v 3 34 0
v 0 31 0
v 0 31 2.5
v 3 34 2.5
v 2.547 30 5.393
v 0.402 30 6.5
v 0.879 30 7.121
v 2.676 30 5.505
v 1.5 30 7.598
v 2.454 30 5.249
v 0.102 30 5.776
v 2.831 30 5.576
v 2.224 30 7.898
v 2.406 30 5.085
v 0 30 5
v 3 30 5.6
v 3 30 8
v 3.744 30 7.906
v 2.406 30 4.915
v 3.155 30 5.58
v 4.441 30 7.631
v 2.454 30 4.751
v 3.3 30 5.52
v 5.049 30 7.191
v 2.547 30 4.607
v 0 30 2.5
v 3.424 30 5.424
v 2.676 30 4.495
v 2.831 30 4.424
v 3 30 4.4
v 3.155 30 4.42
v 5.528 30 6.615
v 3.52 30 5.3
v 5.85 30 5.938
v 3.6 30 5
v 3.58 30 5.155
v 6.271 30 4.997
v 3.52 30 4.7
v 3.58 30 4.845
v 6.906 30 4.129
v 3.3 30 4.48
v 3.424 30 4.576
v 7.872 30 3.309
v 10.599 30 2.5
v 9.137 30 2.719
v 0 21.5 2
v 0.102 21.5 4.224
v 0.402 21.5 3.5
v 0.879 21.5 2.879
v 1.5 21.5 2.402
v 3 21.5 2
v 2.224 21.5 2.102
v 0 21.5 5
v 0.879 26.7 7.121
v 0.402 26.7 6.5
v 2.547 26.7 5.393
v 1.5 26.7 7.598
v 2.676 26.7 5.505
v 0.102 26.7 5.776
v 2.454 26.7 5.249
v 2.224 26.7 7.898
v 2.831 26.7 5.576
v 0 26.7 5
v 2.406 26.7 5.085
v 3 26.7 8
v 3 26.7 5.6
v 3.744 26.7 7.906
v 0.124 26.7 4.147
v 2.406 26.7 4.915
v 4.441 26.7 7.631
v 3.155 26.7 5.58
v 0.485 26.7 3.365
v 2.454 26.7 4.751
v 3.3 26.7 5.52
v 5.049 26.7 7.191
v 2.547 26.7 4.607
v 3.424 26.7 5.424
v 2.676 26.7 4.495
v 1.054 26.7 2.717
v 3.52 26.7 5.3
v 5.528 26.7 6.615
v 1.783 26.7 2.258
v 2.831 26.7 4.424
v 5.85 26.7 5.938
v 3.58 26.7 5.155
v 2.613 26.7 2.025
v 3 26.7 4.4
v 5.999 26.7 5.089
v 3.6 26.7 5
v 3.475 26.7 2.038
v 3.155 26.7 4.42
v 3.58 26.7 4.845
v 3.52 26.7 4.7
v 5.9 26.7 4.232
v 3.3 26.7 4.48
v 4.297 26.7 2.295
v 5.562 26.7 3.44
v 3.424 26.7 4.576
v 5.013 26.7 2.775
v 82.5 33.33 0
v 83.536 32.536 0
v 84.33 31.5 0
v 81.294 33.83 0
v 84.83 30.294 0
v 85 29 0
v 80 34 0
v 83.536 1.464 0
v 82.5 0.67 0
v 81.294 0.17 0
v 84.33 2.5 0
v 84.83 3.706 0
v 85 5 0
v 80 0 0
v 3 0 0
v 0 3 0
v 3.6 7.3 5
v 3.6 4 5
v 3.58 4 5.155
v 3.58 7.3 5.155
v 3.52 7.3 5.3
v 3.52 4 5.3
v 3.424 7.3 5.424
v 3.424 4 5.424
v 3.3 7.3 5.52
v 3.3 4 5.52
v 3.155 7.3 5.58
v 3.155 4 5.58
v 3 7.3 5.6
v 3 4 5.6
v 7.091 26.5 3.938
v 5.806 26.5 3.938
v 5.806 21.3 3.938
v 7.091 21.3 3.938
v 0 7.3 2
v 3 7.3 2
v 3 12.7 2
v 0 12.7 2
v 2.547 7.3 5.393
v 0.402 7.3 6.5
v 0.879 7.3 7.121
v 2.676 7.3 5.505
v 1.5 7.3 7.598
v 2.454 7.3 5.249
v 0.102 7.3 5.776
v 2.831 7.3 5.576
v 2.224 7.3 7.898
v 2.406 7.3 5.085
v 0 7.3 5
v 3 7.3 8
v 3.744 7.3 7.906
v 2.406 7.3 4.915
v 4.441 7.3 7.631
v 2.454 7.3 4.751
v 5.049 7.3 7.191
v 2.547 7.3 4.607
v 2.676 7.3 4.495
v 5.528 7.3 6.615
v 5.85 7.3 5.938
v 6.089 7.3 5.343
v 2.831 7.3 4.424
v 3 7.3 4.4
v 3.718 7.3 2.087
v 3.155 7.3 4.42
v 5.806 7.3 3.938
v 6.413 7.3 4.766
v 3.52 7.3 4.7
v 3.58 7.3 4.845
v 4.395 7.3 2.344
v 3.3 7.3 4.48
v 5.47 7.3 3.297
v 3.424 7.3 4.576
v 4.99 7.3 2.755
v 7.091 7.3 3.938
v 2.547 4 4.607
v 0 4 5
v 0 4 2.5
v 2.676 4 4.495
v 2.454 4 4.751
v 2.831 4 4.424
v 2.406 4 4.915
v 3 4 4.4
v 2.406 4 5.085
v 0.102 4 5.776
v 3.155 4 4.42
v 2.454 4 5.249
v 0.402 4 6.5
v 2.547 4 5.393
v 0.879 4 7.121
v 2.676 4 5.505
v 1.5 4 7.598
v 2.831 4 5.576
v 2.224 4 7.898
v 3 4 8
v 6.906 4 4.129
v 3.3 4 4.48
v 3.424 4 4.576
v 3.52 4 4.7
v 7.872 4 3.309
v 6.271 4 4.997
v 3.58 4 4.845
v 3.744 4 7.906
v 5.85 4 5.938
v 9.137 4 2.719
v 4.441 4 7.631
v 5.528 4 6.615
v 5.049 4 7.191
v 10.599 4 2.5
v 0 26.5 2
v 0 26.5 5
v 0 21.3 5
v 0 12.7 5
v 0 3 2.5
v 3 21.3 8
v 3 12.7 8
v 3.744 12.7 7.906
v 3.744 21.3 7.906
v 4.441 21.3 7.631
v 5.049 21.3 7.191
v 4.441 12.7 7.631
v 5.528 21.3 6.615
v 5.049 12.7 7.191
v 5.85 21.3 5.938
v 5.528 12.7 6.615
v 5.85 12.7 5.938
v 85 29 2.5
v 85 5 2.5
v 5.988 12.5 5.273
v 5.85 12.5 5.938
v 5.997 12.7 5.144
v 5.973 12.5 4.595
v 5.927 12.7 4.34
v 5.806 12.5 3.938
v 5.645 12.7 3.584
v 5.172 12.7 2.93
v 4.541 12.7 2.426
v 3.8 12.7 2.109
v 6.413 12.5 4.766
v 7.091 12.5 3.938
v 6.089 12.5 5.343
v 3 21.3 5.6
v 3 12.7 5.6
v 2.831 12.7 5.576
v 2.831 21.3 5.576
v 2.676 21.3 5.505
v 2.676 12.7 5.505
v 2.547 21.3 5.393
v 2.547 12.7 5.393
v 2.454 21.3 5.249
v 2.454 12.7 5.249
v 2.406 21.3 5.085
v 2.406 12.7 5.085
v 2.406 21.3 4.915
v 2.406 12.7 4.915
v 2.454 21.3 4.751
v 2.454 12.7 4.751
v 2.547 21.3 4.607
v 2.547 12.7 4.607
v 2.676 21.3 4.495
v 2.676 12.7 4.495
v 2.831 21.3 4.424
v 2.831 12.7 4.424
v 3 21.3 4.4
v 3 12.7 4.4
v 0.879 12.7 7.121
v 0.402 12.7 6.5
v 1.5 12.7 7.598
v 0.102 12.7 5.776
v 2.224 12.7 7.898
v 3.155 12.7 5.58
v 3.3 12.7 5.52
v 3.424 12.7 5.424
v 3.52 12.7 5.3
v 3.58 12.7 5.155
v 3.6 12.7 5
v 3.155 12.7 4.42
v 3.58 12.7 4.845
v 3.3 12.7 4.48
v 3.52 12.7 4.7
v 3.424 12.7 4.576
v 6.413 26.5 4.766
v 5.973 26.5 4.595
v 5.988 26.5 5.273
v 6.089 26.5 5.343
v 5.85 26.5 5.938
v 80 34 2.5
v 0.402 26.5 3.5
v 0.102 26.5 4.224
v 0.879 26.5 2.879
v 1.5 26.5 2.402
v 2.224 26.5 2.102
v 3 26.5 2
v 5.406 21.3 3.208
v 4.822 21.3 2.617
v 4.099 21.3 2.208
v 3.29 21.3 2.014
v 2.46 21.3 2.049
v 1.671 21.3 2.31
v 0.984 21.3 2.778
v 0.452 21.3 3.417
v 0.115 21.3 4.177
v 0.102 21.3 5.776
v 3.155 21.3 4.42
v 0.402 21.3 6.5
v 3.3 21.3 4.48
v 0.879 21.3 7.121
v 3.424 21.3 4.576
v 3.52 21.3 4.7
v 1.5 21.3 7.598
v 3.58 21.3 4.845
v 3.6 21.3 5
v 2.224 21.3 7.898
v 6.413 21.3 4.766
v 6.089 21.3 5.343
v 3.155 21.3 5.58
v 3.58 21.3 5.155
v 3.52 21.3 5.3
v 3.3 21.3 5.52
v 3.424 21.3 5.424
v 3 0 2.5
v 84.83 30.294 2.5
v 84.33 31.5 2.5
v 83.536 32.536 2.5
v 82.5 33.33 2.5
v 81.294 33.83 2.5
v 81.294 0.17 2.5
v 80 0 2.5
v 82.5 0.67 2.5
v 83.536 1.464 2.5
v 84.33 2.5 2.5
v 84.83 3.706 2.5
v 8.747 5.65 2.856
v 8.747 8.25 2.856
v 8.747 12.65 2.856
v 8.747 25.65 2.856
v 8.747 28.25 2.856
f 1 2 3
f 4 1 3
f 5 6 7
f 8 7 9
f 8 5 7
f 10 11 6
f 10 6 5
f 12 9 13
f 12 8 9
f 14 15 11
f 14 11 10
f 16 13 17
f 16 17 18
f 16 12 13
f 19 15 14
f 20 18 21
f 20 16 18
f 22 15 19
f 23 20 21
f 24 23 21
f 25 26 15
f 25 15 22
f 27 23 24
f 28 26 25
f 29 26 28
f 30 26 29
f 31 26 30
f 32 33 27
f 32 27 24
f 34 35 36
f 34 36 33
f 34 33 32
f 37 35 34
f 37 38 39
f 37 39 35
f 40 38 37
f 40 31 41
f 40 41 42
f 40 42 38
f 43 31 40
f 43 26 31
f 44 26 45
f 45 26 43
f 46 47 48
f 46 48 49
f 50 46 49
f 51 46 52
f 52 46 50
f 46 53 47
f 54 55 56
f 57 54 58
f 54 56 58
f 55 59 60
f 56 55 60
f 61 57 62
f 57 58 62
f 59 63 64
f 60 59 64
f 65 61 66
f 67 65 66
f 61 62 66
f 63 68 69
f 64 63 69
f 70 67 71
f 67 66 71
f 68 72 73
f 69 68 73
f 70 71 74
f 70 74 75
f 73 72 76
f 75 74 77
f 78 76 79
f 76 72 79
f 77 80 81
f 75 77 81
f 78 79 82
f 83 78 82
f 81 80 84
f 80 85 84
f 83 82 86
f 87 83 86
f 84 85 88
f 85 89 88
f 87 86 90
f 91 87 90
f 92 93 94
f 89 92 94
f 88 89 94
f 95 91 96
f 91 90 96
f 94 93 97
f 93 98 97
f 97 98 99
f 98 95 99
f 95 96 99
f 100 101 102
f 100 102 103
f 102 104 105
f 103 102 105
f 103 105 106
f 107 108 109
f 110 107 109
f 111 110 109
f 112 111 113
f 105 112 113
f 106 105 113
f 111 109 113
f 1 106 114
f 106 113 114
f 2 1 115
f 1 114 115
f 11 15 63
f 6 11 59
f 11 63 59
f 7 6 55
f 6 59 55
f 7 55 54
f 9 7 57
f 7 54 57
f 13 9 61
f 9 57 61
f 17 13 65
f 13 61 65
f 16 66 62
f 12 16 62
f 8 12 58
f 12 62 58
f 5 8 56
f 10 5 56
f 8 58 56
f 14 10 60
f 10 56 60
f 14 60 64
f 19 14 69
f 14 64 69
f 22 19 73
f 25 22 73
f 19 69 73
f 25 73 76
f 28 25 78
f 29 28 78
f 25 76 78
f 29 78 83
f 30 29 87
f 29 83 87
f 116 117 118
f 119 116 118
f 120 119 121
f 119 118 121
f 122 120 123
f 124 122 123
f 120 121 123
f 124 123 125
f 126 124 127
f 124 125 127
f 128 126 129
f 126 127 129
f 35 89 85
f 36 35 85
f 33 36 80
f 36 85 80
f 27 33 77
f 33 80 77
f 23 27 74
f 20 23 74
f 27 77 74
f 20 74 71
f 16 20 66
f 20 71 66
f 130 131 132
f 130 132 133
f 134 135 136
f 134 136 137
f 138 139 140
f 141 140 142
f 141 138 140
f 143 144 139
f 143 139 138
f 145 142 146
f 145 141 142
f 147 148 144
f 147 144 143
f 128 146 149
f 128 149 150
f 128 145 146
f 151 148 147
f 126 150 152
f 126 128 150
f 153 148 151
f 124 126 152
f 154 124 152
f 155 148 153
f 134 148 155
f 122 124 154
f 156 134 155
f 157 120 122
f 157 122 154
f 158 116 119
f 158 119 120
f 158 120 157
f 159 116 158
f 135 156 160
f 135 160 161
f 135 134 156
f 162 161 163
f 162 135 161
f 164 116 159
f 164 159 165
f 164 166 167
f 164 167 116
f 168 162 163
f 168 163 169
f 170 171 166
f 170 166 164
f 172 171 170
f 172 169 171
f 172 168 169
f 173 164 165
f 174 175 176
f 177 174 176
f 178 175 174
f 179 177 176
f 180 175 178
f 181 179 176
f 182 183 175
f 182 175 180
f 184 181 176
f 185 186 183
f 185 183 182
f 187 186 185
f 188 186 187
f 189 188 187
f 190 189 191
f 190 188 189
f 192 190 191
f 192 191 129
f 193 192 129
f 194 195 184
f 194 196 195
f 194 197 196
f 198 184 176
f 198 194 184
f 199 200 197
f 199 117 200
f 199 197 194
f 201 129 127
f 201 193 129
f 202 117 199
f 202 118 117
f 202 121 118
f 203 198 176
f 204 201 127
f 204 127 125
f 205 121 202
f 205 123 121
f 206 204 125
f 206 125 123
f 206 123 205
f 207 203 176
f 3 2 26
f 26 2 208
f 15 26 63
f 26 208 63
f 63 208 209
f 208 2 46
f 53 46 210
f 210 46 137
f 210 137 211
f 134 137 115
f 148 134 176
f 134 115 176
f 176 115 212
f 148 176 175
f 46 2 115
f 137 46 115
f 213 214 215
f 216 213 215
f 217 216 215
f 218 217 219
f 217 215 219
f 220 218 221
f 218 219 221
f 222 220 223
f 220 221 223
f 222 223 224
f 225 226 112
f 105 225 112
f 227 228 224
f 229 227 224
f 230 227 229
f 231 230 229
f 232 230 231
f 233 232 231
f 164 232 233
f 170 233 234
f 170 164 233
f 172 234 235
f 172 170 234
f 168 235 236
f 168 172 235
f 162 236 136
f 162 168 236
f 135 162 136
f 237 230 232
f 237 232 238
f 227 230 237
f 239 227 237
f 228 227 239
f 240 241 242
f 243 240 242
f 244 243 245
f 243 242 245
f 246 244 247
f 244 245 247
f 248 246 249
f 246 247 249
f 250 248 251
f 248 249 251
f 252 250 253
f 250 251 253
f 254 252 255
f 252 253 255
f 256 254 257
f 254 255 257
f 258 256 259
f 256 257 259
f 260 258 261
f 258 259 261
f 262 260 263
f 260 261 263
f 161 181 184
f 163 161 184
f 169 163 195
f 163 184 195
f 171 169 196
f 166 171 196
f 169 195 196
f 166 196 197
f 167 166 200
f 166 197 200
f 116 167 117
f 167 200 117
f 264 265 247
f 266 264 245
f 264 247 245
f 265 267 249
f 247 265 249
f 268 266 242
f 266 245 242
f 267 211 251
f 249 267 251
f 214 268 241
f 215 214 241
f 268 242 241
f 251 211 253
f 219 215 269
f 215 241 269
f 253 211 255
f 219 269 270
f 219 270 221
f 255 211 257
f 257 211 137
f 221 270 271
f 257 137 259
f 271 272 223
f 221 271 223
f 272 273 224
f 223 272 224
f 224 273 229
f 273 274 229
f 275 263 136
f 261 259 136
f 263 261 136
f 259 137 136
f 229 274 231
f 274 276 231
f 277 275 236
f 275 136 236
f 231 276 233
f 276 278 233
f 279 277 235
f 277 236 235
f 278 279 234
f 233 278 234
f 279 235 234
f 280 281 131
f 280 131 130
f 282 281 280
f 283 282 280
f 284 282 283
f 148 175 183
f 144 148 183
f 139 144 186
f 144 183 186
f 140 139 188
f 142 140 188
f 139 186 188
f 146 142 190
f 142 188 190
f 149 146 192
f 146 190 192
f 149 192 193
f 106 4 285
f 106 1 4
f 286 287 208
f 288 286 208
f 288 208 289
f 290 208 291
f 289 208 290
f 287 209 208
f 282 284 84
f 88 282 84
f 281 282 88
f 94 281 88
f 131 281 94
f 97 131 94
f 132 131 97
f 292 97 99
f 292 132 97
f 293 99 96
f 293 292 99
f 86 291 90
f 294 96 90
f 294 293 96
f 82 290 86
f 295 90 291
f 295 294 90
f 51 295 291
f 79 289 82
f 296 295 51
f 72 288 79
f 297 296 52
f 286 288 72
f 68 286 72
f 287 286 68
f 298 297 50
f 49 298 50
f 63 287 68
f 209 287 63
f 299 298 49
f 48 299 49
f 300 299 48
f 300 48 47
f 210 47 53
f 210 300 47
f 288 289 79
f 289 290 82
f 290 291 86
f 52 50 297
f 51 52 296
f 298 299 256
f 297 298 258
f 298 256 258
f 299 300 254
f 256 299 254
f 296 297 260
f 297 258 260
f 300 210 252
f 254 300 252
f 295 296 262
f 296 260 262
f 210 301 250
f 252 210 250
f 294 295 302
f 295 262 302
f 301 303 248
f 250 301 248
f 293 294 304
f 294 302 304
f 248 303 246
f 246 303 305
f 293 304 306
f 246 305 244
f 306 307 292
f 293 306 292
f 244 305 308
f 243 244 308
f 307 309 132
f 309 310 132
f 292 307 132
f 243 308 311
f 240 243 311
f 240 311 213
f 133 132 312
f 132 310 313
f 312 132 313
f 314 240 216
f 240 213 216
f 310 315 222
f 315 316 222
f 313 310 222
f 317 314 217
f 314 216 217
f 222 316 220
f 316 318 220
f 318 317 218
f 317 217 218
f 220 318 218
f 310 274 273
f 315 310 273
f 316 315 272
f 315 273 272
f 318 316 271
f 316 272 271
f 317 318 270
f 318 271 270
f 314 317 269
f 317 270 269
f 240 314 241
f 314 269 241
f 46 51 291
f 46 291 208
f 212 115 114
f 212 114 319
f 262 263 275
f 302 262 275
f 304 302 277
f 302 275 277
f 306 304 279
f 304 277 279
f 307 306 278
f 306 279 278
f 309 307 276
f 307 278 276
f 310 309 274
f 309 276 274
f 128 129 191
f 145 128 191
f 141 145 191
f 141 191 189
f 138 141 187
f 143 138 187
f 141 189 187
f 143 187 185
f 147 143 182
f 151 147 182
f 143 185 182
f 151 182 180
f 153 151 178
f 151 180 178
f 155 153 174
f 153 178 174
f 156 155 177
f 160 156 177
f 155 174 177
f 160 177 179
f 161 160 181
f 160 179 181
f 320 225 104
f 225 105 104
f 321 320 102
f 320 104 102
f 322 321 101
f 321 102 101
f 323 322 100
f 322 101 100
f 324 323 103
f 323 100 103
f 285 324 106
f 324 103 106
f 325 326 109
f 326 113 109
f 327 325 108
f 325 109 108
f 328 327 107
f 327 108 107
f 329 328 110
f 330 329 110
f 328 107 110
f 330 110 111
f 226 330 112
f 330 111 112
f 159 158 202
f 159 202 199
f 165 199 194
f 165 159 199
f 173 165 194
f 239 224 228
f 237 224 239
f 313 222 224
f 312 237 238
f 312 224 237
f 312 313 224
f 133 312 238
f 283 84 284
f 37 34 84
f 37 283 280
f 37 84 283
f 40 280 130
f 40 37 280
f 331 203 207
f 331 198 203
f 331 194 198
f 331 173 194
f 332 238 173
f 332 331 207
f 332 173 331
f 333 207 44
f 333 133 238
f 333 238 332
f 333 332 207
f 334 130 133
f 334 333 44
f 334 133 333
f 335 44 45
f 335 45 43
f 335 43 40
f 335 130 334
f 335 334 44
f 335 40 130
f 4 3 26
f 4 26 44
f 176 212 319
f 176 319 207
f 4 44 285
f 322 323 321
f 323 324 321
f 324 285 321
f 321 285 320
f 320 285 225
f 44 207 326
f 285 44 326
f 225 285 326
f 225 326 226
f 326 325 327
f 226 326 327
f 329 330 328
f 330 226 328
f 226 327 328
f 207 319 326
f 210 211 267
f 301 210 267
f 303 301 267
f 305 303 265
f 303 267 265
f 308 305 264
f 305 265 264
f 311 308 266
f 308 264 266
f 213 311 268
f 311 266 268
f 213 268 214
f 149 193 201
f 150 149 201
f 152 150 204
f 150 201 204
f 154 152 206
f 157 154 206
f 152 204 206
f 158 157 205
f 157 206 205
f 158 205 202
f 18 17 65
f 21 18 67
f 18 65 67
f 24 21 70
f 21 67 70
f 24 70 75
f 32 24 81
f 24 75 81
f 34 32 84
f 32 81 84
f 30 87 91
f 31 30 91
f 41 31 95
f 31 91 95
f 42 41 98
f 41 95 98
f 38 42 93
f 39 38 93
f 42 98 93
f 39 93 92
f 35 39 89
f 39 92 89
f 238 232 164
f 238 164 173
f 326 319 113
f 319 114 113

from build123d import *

# Parameters (mm, degrees)
BOSS_EXTRUDE1_DEPTH     = 34
FILLET1_R               = 5
CUT_EXTRUDE1_DEPTH      = 2.7
CUT_EXTRUDE1_DEPTH_BACK = 2.7
SKETCH3_R               = 3
CUT_EXTRUDE2_DEPTH      = 2.5
CUT_EXTRUDE2_DEPTH_BACK = 2.5
CUT_EXTRUDE3_DEPTH      = 2.7
CUT_EXTRUDE3_DEPTH_BACK = 2.7
SKETCH6_R               = 3
SKETCH7_W               = 20.448170552
SKETCH7_H               = 9.707468646
CUT_EXTRUDE4_DEPTH      = 4
SKETCH8_W               = 21.500714273
SKETCH8_H               = 8.005332222
CUT_EXTRUDE5_DEPTH      = 4
CHAMFER1_SIZE           = 3
FILLET2_R               = 5
SKETCH9_W               = 5.495998252
SKETCH9_H               = 5.2
SKETCH9_W_2             = 5.526351164
CUT_EXTRUDE6_DEPTH      = 2


with BuildPart() as part:
    # Sketch1 → Boss-Extrude1 (new body)
    with BuildSketch(Plane(origin=(0, 0, 0), x_dir=(1, 0, 0), z_dir=(0, 1, 0))):
        with BuildLine():
            Line((85, 0), (3, 0))
            Line((3, 0), (3, -2))
            ThreePointArc((3, -2), (3.866025404, -2.127718677), (4.658312395, -2.5))
            Line((4.658312395, -2.5), (85, -2.5))
            Line((85, -2.5), (85, 0))
        make_face()
        with BuildLine():
            Line((3, -2), (3, 0))
            Line((3, 0), (0, 0))
            Line((0, 0), (0, -2.5))
            Line((0, -2.5), (1.341687605, -2.5))
            ThreePointArc((1.341687605, -2.5), (2.133974596, -2.127718677), (3, -2))
        make_face()
        with BuildLine():
            ThreePointArc((0, -5), (0.356617963, -3.581362835), (1.341687605, -2.5))
            Line((1.341687605, -2.5), (0, -2.5))
            Line((0, -2.5), (0, -5))
        make_face()
        with BuildLine():
            Line((3, -4.4), (3, -2.5))
            Line((3, -2.5), (0, -5))
            ThreePointArc((0, -5), (0.878679656, -7.121320344), (3, -8))
            Line((3, -8), (3, -5.6))
            ThreePointArc((3, -5.6), (2.4, -5), (3, -4.4))
        make_face()
        with BuildLine():
            Line((4.658312395, -2.5), (3, -2.5))
            Line((3, -2.5), (3, -4.4))
            ThreePointArc((3, -4.4), (3.424264069, -4.575735931), (3.6, -5))
            ThreePointArc((3.6, -5), (3.424264069, -5.424264069), (3, -5.6))
            Line((3, -5.6), (3, -8))
            ThreePointArc((3, -8), (5.121320344, -7.121320344), (6, -5))
            ThreePointArc((6, -5), (5.643382037, -3.581362835), (4.658312395, -2.5))
        make_face()
        with BuildLine():
            Line((0, -5), (3, -2.5))
            Line((3, -2.5), (1.341687605, -2.5))
            ThreePointArc((1.341687605, -2.5), (0.356617963, -3.581362835), (0, -5))
        make_face()
        with BuildLine():
            Line((3, -2.5), (3, -2))
            ThreePointArc((3, -2), (2.133974596, -2.127718677), (1.341687605, -2.5))
            Line((1.341687605, -2.5), (3, -2.5))
        make_face()
        with BuildLine():
            ThreePointArc((4.658312395, -2.5), (3.866025404, -2.127718677), (3, -2))
            Line((3, -2), (3, -2.5))
            Line((3, -2.5), (4.658312395, -2.5))
        make_face()
    extrude(amount=BOSS_EXTRUDE1_DEPTH)

    # Fillet1
    fillet1_edges = [part.edges().sort_by_distance(p)[0] for p in [
        (4.658312395, 17, 2.5),
    ]]
    fillet(fillet1_edges, radius=FILLET1_R)

    # Sketch3 → Cut-Extrude1 (cut, two sides: drawn at the far end of the back side and taken through both)
    with BuildSketch(Plane(origin=(0, 24, 0), x_dir=(1, 0, 0), z_dir=(0, 1, 0)).offset(-CUT_EXTRUDE1_DEPTH_BACK)):
        with Locations((3, -5)):
            Circle(SKETCH3_R)
    extrude(amount=CUT_EXTRUDE1_DEPTH + CUT_EXTRUDE1_DEPTH_BACK, mode=Mode.SUBTRACT)

    # Sketch5 → Cut-Extrude2 (cut, two sides: drawn at the far end of the back side and taken through both)
    with BuildSketch(Plane(origin=(0, 24, 0), x_dir=(1, 0, 0), z_dir=(0, 1, 0)).offset(-CUT_EXTRUDE2_DEPTH_BACK)):
        Polygon((3, -2), (-2.094466052, -2), (-2.094466052, -6.13547251), (2.720170219, -6.13547251), align=None)
    extrude(amount=CUT_EXTRUDE2_DEPTH + CUT_EXTRUDE2_DEPTH_BACK, mode=Mode.SUBTRACT)

    # Sketch6 → Cut-Extrude3 (cut, two sides: drawn at the far end of the back side and taken through both)
    with BuildSketch(Plane(origin=(0, 10, 0), x_dir=(1, 0, 0), z_dir=(0, 1, 0)).offset(-CUT_EXTRUDE3_DEPTH_BACK)):
        with Locations((3, -5)):
            Circle(SKETCH6_R)
        with BuildLine():
            ThreePointArc((0, -5), (0.878679656, -2.878679656), (3, -2))
            Line((3, -2), (0, -2))
            Line((0, -2), (0, -5))
        make_face()
    extrude(amount=CUT_EXTRUDE3_DEPTH + CUT_EXTRUDE3_DEPTH_BACK, mode=Mode.SUBTRACT)

    # Sketch7 → Cut-Extrude4 (cut)
    with BuildSketch(Plane(origin=(0, 34, 0), x_dir=(1, 0, 0), z_dir=(0, 1, 0))):
        with Locations((4.670623526, -7.353734323)):
            Rectangle(SKETCH7_W, SKETCH7_H)
    extrude(amount=-CUT_EXTRUDE4_DEPTH, mode=Mode.SUBTRACT)

    # Sketch8 → Cut-Extrude5 (cut)
    with BuildSketch(Plane.XZ):
        with Locations((3.718915286, 6.502666111)):
            Rectangle(SKETCH8_W, SKETCH8_H)
    extrude(amount=-CUT_EXTRUDE5_DEPTH, mode=Mode.SUBTRACT)

    # Chamfer1
    chamfer1_edges = [part.edges().sort_by_distance(p)[0] for p in [
        (0, 0, 1.25),
        (0, 34, 1.25),
    ]]
    chamfer(chamfer1_edges, length=CHAMFER1_SIZE)

    # Fillet2
    fillet2_edges = [part.edges().sort_by_distance(p)[0] for p in [
        (85, 34, 1.25),
        (85, 0, 1.25),
    ]]
    fillet(fillet2_edges, radius=FILLET2_R)

    # Sketch9 → Cut-Extrude6 (cut)
    with BuildSketch(Plane.XY.offset(5.9375)):
        with Locations((6.215533717, 9.9)):
            Rectangle(SKETCH9_W, SKETCH9_H)
        with Locations((5.763175582, 23.9)):
            Rectangle(SKETCH9_W_2, SKETCH9_H)
    extrude(amount=-CUT_EXTRUDE6_DEPTH, mode=Mode.SUBTRACT)


solid = part.part
